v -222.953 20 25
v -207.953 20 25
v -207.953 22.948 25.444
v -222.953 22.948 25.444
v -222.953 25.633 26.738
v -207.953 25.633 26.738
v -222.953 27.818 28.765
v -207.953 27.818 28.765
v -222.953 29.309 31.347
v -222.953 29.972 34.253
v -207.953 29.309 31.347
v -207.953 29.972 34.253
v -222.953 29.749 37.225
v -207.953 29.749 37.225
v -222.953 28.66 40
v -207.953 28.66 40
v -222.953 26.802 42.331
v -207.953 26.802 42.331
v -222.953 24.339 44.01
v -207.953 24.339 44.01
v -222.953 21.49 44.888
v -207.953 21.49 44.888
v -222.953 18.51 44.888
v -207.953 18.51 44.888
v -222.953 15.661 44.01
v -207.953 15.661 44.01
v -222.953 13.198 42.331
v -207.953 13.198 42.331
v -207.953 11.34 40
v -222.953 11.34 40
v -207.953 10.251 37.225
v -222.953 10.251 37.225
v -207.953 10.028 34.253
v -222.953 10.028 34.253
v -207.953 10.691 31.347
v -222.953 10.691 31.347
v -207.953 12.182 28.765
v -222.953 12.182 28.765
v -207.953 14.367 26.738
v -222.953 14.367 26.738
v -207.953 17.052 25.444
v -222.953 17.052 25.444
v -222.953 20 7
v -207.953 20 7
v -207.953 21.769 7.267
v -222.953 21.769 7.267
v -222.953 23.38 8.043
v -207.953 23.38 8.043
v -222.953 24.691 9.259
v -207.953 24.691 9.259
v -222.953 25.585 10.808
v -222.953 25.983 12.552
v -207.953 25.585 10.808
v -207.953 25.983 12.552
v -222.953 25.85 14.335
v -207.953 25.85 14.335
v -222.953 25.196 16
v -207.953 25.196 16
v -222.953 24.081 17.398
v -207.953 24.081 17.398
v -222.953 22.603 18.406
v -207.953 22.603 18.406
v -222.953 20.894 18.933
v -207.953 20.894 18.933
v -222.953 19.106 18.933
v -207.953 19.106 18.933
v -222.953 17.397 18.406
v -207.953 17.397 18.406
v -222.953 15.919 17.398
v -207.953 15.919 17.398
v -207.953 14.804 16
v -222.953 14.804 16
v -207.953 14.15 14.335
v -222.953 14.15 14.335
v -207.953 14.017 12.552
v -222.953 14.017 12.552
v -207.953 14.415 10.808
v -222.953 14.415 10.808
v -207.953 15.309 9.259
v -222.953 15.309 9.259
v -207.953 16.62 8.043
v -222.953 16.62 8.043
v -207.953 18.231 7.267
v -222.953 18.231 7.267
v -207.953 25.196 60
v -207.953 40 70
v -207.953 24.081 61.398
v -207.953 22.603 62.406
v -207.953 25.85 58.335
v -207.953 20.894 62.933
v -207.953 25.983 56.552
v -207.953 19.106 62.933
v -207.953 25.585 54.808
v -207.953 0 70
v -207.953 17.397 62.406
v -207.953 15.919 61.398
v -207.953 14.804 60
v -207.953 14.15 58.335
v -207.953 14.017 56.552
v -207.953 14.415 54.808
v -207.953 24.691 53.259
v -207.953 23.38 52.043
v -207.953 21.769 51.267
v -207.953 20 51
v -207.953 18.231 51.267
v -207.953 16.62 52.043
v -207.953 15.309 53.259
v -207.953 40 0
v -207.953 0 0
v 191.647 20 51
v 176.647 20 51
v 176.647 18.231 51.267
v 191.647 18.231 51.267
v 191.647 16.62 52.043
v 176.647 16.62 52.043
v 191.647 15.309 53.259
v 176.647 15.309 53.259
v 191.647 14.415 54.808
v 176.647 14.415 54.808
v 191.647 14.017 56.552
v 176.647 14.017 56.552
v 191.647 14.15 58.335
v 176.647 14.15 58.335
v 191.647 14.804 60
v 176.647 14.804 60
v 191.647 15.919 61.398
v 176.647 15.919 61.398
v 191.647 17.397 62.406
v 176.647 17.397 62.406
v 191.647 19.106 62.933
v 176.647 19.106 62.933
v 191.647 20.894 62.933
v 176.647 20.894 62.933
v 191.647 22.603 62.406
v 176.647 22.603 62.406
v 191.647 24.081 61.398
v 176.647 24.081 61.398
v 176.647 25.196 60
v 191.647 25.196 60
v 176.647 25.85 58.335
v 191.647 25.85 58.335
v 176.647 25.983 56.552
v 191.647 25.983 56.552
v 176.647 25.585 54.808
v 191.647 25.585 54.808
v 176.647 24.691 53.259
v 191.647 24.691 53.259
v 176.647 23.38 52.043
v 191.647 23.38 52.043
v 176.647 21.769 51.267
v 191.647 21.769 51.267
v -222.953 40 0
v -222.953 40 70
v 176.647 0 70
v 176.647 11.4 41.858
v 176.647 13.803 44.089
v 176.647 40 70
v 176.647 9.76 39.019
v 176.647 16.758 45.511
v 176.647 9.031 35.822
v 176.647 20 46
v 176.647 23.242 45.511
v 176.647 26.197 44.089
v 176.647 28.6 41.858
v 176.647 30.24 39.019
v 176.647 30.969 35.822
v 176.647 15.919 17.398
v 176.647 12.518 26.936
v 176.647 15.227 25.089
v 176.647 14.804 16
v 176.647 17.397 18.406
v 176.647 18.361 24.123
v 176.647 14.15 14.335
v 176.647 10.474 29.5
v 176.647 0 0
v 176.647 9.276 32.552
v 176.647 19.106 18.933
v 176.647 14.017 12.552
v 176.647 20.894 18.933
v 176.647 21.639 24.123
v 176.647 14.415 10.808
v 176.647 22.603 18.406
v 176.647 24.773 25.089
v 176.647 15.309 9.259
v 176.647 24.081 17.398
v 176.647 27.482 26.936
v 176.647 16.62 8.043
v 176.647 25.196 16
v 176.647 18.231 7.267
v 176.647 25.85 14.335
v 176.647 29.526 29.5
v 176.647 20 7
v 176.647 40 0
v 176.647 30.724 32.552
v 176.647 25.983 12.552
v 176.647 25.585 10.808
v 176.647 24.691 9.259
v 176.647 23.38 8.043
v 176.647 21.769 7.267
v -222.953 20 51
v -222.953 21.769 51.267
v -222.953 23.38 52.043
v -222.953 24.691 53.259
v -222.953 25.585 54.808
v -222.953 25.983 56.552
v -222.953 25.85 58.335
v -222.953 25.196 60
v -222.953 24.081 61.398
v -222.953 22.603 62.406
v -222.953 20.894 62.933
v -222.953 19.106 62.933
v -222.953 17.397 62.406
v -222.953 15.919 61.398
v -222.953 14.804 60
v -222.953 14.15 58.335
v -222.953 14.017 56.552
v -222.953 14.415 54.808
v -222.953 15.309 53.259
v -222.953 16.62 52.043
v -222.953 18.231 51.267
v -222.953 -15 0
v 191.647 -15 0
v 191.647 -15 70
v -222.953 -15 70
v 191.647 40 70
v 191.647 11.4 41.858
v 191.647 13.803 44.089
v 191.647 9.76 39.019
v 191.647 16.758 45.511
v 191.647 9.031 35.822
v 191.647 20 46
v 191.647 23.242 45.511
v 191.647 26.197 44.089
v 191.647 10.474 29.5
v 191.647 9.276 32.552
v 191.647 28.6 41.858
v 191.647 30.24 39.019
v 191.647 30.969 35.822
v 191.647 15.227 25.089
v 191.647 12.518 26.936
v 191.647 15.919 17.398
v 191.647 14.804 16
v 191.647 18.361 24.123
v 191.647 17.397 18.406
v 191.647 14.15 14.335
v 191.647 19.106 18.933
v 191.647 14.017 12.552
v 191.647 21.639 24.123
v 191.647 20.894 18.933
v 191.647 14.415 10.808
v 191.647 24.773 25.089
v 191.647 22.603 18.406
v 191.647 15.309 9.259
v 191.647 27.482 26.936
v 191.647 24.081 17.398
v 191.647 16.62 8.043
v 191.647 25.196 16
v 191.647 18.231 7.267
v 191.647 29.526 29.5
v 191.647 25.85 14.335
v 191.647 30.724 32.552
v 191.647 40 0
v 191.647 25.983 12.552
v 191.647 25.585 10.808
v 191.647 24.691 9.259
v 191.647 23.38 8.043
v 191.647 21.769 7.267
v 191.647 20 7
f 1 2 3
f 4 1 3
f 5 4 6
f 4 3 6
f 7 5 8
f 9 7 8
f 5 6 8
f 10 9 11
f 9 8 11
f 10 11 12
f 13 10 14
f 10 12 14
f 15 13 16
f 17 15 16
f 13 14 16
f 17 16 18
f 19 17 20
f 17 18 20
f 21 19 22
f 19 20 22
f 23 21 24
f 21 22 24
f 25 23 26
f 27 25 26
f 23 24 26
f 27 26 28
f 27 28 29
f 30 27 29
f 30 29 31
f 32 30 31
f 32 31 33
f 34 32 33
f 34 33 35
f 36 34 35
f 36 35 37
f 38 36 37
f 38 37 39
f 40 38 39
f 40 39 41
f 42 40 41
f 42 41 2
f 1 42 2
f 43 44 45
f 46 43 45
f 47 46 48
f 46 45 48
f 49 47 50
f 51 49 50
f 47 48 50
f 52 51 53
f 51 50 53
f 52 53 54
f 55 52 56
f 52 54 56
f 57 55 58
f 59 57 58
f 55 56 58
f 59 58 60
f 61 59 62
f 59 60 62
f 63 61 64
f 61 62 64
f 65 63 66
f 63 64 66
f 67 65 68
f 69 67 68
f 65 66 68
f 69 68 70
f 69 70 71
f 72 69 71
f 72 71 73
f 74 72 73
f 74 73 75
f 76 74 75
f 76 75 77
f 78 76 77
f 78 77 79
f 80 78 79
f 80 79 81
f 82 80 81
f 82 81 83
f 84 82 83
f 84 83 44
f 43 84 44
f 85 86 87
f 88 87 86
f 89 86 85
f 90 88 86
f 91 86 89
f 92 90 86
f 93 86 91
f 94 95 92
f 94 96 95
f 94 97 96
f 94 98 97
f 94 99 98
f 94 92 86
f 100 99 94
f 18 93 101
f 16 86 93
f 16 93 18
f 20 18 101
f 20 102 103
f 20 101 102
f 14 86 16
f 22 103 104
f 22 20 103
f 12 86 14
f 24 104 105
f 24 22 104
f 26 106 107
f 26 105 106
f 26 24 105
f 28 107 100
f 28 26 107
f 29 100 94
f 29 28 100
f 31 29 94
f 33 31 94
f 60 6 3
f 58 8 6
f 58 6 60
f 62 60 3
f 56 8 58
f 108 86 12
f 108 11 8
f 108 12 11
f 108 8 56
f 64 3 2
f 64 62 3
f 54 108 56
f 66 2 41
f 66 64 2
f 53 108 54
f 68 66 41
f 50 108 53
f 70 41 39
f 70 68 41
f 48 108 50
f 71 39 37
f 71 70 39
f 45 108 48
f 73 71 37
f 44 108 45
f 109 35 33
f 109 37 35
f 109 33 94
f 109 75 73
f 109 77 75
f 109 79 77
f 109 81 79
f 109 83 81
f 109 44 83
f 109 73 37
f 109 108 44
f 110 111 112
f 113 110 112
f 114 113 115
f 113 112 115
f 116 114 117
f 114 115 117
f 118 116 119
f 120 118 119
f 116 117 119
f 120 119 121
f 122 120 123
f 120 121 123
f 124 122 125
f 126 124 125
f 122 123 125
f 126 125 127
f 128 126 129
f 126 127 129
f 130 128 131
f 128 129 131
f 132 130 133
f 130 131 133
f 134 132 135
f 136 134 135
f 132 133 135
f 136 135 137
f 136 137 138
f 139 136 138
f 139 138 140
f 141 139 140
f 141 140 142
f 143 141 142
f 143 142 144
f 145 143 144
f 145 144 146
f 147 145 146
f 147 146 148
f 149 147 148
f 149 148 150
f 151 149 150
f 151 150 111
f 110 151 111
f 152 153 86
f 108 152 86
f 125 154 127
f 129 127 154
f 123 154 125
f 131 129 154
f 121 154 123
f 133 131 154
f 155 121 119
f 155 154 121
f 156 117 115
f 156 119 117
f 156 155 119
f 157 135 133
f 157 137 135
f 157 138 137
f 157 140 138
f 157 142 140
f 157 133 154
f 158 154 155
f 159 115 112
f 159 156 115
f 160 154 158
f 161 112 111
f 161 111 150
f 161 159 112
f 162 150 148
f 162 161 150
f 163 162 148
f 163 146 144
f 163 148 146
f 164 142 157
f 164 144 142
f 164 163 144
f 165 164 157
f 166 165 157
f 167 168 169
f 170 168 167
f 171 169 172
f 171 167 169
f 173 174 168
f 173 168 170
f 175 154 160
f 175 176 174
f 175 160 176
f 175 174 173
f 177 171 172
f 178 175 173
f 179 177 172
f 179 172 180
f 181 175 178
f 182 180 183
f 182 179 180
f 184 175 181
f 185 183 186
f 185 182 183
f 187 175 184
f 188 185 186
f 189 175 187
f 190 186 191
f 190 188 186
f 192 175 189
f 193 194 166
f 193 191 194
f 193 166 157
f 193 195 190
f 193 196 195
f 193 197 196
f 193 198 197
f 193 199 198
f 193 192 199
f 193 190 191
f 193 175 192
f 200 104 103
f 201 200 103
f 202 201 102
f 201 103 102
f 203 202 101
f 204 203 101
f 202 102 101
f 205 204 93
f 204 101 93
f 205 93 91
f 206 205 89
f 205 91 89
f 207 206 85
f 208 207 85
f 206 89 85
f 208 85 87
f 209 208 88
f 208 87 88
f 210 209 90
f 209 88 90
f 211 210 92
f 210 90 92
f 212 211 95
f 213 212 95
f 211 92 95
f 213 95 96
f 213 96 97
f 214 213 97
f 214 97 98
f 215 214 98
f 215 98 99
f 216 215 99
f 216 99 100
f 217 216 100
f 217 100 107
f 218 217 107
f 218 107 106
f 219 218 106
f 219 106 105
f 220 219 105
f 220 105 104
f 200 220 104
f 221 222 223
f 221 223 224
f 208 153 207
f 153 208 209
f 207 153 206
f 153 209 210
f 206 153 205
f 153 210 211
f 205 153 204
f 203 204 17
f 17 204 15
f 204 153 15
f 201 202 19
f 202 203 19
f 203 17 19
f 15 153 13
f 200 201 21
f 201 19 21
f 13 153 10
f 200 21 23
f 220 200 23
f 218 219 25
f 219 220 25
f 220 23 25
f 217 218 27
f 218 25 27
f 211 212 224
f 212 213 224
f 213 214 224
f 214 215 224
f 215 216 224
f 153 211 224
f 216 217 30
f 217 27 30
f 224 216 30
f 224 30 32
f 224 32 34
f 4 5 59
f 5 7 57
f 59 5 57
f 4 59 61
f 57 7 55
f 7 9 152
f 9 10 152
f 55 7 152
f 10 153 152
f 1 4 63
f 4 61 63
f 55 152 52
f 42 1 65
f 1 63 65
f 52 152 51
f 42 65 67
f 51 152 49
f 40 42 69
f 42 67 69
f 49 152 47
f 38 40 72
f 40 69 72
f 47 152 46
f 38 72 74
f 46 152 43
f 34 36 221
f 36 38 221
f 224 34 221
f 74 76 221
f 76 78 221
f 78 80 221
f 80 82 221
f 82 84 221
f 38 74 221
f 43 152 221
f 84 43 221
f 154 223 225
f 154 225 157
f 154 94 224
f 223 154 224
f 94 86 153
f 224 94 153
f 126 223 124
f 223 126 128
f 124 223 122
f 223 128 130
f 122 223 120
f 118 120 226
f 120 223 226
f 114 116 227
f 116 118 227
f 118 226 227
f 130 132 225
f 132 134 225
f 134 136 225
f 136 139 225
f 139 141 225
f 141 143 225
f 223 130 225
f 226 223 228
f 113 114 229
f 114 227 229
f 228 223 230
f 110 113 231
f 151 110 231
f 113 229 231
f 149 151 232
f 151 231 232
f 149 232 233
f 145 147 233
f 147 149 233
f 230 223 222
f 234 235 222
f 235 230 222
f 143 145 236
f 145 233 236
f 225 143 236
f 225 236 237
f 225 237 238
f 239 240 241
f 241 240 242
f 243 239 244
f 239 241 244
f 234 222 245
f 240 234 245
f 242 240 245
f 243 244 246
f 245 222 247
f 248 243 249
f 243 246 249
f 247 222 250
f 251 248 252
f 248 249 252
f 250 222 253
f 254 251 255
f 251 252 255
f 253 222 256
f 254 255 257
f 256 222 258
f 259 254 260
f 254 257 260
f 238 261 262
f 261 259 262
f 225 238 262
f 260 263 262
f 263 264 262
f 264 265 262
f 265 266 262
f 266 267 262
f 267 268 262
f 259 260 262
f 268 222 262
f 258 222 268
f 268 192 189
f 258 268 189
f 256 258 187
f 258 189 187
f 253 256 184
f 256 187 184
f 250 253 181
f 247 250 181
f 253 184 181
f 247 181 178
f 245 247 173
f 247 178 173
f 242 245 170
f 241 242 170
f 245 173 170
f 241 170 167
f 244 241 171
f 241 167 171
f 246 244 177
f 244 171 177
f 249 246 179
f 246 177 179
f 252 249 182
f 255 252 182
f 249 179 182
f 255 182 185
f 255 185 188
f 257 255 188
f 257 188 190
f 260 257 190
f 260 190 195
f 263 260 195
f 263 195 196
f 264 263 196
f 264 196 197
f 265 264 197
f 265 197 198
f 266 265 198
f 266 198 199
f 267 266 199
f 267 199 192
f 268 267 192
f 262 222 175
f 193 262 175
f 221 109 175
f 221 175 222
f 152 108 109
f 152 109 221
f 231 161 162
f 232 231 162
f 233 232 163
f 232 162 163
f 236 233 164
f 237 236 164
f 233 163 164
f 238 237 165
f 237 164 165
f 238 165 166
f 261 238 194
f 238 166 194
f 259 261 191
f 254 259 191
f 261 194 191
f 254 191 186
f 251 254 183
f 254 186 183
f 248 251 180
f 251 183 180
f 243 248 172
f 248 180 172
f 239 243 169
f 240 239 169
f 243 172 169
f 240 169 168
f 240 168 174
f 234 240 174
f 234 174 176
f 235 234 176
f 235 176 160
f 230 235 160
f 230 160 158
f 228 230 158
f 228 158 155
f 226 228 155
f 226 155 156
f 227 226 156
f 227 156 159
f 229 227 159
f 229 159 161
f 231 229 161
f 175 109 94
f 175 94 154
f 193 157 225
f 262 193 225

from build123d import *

# Parameters (mm, degrees)
BOSS_EXTRUDE3_DEPTH = 70
SKETCH2_R           = 10
CUT_EXTRUDE1_DEPTH  = 408.652008458
SKETCH3_R           = 6
CUT_EXTRUDE2_DEPTH  = 408.652008458
SKETCH4_R           = 11
CUT_EXTRUDE3_DEPTH  = 408.652008458
SKETCH5_R           = 6
CUT_EXTRUDE4_DEPTH  = 408.652008458


with BuildPart() as part:
    # Sketch1 → Boss-Extrude3 (new body)
    with BuildSketch(Plane.XY):
        Polygon((-207.952872216, 0), (176.647127784, 0), (176.647127784, 40), (191.647127784, 40), (191.647127784, 0), (191.647127784, -15), (-222.952872216, -15), (-222.952872216, 0), (-222.952872216, 40), (-207.952872216, 40), align=None)
    extrude(amount=BOSS_EXTRUDE3_DEPTH)

    # Sketch2 → Cut-Extrude1 (cut, through all)
    with BuildSketch(Plane(origin=(-207.952872216, 0, 0), x_dir=(0, 0, -1), z_dir=(1, 0, 0))):
        with Locations((-35, 20)):
            Circle(SKETCH2_R)
    extrude(amount=-CUT_EXTRUDE1_DEPTH, mode=Mode.SUBTRACT)

    # Sketch3 → Cut-Extrude2 (cut, through all)
    with BuildSketch(Plane(origin=(-207.952872216, 0, 0), x_dir=(0, 0, -1), z_dir=(1, 0, 0))):
        with Locations((-13, 20)):
            Circle(SKETCH3_R)
        with Locations((-57, 20)):
            Circle(SKETCH3_R)
    extrude(amount=-CUT_EXTRUDE2_DEPTH, mode=Mode.SUBTRACT)

    # Sketch4 → Cut-Extrude3 (cut, through all)
    with BuildSketch(Plane.ZY.offset(-176.647127784)):
        with Locations((35, 20)):
            Circle(SKETCH4_R)
    extrude(amount=-CUT_EXTRUDE3_DEPTH, mode=Mode.SUBTRACT)

    # Sketch5 → Cut-Extrude4 (cut, through all)
    with BuildSketch(Plane.ZY.offset(-176.647127784)):
        with Locations(Location((57, 20, 0), (0, 0, 180))):
            Circle(SKETCH5_R)
        with Locations(Location((13, 20, 0), (0, 0, 180))):
            Circle(SKETCH5_R)
    extrude(amount=-CUT_EXTRUDE4_DEPTH, mode=Mode.SUBTRACT)


solid = part.part
